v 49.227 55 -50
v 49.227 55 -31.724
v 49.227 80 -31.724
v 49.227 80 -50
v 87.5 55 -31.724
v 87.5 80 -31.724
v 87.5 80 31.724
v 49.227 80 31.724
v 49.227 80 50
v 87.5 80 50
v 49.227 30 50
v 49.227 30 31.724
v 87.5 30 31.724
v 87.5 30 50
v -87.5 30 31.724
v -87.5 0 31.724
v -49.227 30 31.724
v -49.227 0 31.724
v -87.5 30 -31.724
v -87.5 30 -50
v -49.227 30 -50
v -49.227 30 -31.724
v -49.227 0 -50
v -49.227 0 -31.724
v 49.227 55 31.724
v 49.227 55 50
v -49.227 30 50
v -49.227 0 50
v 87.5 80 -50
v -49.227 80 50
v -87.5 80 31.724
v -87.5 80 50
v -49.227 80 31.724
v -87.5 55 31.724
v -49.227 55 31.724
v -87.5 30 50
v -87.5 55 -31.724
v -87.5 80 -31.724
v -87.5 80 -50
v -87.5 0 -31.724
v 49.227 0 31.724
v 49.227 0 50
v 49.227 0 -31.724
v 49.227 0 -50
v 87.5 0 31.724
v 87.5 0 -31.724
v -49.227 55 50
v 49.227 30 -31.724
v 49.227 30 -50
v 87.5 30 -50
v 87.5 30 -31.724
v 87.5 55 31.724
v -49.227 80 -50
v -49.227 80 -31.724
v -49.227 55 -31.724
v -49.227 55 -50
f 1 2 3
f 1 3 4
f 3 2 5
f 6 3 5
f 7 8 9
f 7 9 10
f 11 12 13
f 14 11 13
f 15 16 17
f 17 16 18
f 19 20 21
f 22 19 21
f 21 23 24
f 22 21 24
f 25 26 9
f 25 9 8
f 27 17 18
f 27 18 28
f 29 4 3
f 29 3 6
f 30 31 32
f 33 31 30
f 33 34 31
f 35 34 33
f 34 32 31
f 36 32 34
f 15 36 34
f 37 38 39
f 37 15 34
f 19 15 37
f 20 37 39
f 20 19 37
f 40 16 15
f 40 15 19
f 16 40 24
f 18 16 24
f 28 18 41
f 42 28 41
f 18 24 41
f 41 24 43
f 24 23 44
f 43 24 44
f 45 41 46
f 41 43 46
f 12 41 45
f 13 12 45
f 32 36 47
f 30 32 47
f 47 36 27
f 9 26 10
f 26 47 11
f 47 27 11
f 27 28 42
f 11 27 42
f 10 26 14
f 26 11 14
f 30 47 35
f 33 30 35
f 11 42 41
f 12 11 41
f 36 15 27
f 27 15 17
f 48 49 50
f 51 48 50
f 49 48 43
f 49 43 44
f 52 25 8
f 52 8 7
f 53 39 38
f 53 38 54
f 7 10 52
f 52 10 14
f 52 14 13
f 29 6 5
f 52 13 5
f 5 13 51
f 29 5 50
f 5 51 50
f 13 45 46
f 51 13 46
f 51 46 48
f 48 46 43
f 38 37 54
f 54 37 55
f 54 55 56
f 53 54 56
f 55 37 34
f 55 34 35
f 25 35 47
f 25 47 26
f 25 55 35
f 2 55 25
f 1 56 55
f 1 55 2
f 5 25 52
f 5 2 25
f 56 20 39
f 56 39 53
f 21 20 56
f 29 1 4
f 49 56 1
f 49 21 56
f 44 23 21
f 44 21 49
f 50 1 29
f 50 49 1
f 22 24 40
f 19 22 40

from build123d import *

# Parameters (mm, degrees)
BOSS_EXTRUDE1_DEPTH      = 55
BOSS_EXTRUDE2_DEPTH      = 25
BOSS_EXTRUDE2_DEPTH_BACK = 25
SKETCH3_W                = 38.273351984
SKETCH3_H                = 18.275853279


with BuildPart() as part:
    # Sketch1 → Boss-Extrude1 (new body)
    with BuildSketch(Plane(origin=(0, 0, 0), x_dir=(1, 0, 0), z_dir=(0, 1, 0))):
        Polygon((87.5, -31.724146721), (87.5, 31.724146721), (49.226648016, 31.724146721), (49.226648016, 50), (-49.226648016, 50), (-49.226648016, 31.724146721), (-87.5, 31.724146721), (-87.5, -31.724146721), (-49.226648016, -31.724146721), (-49.226648016, -50), (49.226648016, -50), (49.226648016, -31.724146721), align=None)
    extrude(amount=BOSS_EXTRUDE1_DEPTH)

    # Sketch3 → Boss-Extrude2 (add, two sides: drawn at the far end of the back side and taken through both)
    with BuildSketch(Plane(origin=(0, 55, 0), x_dir=(1, 0, 0), z_dir=(0, 1, 0)).offset(-BOSS_EXTRUDE2_DEPTH_BACK)):
        with Locations((-68.363324008, 40.86207336)):
            Rectangle(SKETCH3_W, SKETCH3_H)
        with Locations((-68.363324008, -40.86207336)):
            Rectangle(SKETCH3_W, SKETCH3_H)
        with Locations((68.363324008, -40.86207336)):
            Rectangle(SKETCH3_W, SKETCH3_H)
        with Locations((68.363324008, 40.86207336)):
            Rectangle(SKETCH3_W, SKETCH3_H)
    extrude(amount=BOSS_EXTRUDE2_DEPTH + BOSS_EXTRUDE2_DEPTH_BACK)


solid = part.part
